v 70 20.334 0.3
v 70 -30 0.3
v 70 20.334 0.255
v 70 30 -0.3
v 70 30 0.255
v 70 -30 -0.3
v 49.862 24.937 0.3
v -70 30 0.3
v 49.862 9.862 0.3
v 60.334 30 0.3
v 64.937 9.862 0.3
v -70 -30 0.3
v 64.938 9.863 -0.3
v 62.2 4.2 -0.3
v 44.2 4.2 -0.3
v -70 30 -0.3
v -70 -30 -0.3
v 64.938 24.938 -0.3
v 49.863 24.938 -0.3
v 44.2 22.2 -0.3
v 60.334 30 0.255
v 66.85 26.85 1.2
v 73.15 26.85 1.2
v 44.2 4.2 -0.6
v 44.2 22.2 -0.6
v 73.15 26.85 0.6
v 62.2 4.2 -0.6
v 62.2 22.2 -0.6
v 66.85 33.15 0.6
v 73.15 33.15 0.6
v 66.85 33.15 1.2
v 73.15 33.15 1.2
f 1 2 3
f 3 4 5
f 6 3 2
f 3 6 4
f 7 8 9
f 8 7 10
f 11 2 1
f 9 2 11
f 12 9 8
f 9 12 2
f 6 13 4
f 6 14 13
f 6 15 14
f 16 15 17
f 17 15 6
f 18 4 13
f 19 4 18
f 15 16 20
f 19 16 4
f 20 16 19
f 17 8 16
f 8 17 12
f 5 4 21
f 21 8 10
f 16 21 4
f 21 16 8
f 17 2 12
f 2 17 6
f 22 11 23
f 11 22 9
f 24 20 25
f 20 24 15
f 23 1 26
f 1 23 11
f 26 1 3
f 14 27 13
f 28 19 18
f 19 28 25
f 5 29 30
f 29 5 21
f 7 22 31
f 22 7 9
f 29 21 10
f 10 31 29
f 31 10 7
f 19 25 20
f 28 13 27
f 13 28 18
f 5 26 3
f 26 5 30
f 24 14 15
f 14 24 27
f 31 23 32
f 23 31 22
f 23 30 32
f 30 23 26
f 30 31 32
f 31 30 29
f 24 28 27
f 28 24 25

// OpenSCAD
// A sheet: Sellotape tape (thin rectangular sheet/strip)
// Simple, single solid object, with slight overlaps for robust union

$fn = 96;

// Parameters (mm)
sheet_length = 140;          // overall length of tape sheet
sheet_width  = 60;           // overall width
sheet_thickness = 0.6;       // thin sheet thickness

// Optional subtle "folded corner" to make it recognizable as a sheet of tape
corner_fold_size = 18;       // size of folded corner square
corner_fold_lift = 1.2;      // how much the corner lifts (still connected)
corner_fold_thickness = 0.6; // same thickness as sheet

// Connectivity overlap (1-2mm)
overlap = 1.2;

// Base sheet
module tape_sheet_base() {
  cube([sheet_length, sheet_width, sheet_thickness], center=true);
}

// Folded corner (a small wedge-like flap) - connected via overlap
module tape_sheet_folded_corner() {
  // Place at +X +Y corner of the sheet
  // Base sheet extents: X = ±sheet_length/2, Y = ±sheet_width/2
  // Fold piece centered near the corner, slightly above, but overlapping into the sheet by 'overlap'
  translate([
    sheet_length/2 - corner_fold_size/2 + overlap/2,
    sheet_width/2  - corner_fold_size/2 + overlap/2,
    sheet_thickness/2 + corner_fold_lift/2 - overlap/2
  ])
  // Create a simple ramp by hulling two thin rectangles
  hull() {
    // Attached edge (touching/overlapping the sheet)
    translate([-corner_fold_size/2 + overlap/2, -corner_fold_size/2 + overlap/2, -corner_fold_lift/2])
      cube([corner_fold_size, corner_fold_size, corner_fold_thickness], center=true);

    // Lifted tip (slightly raised)
    translate([corner_fold_size/2 - overlap/2, corner_fold_size/2 - overlap/2, corner_fold_lift/2])
      cube([corner_fold_size*0.35, corner_fold_size*0.35, corner_fold_thickness], center=true);
  }
}

// Final single solid
union() {
  tape_sheet_base();
  tape_sheet_folded_corner();
}
